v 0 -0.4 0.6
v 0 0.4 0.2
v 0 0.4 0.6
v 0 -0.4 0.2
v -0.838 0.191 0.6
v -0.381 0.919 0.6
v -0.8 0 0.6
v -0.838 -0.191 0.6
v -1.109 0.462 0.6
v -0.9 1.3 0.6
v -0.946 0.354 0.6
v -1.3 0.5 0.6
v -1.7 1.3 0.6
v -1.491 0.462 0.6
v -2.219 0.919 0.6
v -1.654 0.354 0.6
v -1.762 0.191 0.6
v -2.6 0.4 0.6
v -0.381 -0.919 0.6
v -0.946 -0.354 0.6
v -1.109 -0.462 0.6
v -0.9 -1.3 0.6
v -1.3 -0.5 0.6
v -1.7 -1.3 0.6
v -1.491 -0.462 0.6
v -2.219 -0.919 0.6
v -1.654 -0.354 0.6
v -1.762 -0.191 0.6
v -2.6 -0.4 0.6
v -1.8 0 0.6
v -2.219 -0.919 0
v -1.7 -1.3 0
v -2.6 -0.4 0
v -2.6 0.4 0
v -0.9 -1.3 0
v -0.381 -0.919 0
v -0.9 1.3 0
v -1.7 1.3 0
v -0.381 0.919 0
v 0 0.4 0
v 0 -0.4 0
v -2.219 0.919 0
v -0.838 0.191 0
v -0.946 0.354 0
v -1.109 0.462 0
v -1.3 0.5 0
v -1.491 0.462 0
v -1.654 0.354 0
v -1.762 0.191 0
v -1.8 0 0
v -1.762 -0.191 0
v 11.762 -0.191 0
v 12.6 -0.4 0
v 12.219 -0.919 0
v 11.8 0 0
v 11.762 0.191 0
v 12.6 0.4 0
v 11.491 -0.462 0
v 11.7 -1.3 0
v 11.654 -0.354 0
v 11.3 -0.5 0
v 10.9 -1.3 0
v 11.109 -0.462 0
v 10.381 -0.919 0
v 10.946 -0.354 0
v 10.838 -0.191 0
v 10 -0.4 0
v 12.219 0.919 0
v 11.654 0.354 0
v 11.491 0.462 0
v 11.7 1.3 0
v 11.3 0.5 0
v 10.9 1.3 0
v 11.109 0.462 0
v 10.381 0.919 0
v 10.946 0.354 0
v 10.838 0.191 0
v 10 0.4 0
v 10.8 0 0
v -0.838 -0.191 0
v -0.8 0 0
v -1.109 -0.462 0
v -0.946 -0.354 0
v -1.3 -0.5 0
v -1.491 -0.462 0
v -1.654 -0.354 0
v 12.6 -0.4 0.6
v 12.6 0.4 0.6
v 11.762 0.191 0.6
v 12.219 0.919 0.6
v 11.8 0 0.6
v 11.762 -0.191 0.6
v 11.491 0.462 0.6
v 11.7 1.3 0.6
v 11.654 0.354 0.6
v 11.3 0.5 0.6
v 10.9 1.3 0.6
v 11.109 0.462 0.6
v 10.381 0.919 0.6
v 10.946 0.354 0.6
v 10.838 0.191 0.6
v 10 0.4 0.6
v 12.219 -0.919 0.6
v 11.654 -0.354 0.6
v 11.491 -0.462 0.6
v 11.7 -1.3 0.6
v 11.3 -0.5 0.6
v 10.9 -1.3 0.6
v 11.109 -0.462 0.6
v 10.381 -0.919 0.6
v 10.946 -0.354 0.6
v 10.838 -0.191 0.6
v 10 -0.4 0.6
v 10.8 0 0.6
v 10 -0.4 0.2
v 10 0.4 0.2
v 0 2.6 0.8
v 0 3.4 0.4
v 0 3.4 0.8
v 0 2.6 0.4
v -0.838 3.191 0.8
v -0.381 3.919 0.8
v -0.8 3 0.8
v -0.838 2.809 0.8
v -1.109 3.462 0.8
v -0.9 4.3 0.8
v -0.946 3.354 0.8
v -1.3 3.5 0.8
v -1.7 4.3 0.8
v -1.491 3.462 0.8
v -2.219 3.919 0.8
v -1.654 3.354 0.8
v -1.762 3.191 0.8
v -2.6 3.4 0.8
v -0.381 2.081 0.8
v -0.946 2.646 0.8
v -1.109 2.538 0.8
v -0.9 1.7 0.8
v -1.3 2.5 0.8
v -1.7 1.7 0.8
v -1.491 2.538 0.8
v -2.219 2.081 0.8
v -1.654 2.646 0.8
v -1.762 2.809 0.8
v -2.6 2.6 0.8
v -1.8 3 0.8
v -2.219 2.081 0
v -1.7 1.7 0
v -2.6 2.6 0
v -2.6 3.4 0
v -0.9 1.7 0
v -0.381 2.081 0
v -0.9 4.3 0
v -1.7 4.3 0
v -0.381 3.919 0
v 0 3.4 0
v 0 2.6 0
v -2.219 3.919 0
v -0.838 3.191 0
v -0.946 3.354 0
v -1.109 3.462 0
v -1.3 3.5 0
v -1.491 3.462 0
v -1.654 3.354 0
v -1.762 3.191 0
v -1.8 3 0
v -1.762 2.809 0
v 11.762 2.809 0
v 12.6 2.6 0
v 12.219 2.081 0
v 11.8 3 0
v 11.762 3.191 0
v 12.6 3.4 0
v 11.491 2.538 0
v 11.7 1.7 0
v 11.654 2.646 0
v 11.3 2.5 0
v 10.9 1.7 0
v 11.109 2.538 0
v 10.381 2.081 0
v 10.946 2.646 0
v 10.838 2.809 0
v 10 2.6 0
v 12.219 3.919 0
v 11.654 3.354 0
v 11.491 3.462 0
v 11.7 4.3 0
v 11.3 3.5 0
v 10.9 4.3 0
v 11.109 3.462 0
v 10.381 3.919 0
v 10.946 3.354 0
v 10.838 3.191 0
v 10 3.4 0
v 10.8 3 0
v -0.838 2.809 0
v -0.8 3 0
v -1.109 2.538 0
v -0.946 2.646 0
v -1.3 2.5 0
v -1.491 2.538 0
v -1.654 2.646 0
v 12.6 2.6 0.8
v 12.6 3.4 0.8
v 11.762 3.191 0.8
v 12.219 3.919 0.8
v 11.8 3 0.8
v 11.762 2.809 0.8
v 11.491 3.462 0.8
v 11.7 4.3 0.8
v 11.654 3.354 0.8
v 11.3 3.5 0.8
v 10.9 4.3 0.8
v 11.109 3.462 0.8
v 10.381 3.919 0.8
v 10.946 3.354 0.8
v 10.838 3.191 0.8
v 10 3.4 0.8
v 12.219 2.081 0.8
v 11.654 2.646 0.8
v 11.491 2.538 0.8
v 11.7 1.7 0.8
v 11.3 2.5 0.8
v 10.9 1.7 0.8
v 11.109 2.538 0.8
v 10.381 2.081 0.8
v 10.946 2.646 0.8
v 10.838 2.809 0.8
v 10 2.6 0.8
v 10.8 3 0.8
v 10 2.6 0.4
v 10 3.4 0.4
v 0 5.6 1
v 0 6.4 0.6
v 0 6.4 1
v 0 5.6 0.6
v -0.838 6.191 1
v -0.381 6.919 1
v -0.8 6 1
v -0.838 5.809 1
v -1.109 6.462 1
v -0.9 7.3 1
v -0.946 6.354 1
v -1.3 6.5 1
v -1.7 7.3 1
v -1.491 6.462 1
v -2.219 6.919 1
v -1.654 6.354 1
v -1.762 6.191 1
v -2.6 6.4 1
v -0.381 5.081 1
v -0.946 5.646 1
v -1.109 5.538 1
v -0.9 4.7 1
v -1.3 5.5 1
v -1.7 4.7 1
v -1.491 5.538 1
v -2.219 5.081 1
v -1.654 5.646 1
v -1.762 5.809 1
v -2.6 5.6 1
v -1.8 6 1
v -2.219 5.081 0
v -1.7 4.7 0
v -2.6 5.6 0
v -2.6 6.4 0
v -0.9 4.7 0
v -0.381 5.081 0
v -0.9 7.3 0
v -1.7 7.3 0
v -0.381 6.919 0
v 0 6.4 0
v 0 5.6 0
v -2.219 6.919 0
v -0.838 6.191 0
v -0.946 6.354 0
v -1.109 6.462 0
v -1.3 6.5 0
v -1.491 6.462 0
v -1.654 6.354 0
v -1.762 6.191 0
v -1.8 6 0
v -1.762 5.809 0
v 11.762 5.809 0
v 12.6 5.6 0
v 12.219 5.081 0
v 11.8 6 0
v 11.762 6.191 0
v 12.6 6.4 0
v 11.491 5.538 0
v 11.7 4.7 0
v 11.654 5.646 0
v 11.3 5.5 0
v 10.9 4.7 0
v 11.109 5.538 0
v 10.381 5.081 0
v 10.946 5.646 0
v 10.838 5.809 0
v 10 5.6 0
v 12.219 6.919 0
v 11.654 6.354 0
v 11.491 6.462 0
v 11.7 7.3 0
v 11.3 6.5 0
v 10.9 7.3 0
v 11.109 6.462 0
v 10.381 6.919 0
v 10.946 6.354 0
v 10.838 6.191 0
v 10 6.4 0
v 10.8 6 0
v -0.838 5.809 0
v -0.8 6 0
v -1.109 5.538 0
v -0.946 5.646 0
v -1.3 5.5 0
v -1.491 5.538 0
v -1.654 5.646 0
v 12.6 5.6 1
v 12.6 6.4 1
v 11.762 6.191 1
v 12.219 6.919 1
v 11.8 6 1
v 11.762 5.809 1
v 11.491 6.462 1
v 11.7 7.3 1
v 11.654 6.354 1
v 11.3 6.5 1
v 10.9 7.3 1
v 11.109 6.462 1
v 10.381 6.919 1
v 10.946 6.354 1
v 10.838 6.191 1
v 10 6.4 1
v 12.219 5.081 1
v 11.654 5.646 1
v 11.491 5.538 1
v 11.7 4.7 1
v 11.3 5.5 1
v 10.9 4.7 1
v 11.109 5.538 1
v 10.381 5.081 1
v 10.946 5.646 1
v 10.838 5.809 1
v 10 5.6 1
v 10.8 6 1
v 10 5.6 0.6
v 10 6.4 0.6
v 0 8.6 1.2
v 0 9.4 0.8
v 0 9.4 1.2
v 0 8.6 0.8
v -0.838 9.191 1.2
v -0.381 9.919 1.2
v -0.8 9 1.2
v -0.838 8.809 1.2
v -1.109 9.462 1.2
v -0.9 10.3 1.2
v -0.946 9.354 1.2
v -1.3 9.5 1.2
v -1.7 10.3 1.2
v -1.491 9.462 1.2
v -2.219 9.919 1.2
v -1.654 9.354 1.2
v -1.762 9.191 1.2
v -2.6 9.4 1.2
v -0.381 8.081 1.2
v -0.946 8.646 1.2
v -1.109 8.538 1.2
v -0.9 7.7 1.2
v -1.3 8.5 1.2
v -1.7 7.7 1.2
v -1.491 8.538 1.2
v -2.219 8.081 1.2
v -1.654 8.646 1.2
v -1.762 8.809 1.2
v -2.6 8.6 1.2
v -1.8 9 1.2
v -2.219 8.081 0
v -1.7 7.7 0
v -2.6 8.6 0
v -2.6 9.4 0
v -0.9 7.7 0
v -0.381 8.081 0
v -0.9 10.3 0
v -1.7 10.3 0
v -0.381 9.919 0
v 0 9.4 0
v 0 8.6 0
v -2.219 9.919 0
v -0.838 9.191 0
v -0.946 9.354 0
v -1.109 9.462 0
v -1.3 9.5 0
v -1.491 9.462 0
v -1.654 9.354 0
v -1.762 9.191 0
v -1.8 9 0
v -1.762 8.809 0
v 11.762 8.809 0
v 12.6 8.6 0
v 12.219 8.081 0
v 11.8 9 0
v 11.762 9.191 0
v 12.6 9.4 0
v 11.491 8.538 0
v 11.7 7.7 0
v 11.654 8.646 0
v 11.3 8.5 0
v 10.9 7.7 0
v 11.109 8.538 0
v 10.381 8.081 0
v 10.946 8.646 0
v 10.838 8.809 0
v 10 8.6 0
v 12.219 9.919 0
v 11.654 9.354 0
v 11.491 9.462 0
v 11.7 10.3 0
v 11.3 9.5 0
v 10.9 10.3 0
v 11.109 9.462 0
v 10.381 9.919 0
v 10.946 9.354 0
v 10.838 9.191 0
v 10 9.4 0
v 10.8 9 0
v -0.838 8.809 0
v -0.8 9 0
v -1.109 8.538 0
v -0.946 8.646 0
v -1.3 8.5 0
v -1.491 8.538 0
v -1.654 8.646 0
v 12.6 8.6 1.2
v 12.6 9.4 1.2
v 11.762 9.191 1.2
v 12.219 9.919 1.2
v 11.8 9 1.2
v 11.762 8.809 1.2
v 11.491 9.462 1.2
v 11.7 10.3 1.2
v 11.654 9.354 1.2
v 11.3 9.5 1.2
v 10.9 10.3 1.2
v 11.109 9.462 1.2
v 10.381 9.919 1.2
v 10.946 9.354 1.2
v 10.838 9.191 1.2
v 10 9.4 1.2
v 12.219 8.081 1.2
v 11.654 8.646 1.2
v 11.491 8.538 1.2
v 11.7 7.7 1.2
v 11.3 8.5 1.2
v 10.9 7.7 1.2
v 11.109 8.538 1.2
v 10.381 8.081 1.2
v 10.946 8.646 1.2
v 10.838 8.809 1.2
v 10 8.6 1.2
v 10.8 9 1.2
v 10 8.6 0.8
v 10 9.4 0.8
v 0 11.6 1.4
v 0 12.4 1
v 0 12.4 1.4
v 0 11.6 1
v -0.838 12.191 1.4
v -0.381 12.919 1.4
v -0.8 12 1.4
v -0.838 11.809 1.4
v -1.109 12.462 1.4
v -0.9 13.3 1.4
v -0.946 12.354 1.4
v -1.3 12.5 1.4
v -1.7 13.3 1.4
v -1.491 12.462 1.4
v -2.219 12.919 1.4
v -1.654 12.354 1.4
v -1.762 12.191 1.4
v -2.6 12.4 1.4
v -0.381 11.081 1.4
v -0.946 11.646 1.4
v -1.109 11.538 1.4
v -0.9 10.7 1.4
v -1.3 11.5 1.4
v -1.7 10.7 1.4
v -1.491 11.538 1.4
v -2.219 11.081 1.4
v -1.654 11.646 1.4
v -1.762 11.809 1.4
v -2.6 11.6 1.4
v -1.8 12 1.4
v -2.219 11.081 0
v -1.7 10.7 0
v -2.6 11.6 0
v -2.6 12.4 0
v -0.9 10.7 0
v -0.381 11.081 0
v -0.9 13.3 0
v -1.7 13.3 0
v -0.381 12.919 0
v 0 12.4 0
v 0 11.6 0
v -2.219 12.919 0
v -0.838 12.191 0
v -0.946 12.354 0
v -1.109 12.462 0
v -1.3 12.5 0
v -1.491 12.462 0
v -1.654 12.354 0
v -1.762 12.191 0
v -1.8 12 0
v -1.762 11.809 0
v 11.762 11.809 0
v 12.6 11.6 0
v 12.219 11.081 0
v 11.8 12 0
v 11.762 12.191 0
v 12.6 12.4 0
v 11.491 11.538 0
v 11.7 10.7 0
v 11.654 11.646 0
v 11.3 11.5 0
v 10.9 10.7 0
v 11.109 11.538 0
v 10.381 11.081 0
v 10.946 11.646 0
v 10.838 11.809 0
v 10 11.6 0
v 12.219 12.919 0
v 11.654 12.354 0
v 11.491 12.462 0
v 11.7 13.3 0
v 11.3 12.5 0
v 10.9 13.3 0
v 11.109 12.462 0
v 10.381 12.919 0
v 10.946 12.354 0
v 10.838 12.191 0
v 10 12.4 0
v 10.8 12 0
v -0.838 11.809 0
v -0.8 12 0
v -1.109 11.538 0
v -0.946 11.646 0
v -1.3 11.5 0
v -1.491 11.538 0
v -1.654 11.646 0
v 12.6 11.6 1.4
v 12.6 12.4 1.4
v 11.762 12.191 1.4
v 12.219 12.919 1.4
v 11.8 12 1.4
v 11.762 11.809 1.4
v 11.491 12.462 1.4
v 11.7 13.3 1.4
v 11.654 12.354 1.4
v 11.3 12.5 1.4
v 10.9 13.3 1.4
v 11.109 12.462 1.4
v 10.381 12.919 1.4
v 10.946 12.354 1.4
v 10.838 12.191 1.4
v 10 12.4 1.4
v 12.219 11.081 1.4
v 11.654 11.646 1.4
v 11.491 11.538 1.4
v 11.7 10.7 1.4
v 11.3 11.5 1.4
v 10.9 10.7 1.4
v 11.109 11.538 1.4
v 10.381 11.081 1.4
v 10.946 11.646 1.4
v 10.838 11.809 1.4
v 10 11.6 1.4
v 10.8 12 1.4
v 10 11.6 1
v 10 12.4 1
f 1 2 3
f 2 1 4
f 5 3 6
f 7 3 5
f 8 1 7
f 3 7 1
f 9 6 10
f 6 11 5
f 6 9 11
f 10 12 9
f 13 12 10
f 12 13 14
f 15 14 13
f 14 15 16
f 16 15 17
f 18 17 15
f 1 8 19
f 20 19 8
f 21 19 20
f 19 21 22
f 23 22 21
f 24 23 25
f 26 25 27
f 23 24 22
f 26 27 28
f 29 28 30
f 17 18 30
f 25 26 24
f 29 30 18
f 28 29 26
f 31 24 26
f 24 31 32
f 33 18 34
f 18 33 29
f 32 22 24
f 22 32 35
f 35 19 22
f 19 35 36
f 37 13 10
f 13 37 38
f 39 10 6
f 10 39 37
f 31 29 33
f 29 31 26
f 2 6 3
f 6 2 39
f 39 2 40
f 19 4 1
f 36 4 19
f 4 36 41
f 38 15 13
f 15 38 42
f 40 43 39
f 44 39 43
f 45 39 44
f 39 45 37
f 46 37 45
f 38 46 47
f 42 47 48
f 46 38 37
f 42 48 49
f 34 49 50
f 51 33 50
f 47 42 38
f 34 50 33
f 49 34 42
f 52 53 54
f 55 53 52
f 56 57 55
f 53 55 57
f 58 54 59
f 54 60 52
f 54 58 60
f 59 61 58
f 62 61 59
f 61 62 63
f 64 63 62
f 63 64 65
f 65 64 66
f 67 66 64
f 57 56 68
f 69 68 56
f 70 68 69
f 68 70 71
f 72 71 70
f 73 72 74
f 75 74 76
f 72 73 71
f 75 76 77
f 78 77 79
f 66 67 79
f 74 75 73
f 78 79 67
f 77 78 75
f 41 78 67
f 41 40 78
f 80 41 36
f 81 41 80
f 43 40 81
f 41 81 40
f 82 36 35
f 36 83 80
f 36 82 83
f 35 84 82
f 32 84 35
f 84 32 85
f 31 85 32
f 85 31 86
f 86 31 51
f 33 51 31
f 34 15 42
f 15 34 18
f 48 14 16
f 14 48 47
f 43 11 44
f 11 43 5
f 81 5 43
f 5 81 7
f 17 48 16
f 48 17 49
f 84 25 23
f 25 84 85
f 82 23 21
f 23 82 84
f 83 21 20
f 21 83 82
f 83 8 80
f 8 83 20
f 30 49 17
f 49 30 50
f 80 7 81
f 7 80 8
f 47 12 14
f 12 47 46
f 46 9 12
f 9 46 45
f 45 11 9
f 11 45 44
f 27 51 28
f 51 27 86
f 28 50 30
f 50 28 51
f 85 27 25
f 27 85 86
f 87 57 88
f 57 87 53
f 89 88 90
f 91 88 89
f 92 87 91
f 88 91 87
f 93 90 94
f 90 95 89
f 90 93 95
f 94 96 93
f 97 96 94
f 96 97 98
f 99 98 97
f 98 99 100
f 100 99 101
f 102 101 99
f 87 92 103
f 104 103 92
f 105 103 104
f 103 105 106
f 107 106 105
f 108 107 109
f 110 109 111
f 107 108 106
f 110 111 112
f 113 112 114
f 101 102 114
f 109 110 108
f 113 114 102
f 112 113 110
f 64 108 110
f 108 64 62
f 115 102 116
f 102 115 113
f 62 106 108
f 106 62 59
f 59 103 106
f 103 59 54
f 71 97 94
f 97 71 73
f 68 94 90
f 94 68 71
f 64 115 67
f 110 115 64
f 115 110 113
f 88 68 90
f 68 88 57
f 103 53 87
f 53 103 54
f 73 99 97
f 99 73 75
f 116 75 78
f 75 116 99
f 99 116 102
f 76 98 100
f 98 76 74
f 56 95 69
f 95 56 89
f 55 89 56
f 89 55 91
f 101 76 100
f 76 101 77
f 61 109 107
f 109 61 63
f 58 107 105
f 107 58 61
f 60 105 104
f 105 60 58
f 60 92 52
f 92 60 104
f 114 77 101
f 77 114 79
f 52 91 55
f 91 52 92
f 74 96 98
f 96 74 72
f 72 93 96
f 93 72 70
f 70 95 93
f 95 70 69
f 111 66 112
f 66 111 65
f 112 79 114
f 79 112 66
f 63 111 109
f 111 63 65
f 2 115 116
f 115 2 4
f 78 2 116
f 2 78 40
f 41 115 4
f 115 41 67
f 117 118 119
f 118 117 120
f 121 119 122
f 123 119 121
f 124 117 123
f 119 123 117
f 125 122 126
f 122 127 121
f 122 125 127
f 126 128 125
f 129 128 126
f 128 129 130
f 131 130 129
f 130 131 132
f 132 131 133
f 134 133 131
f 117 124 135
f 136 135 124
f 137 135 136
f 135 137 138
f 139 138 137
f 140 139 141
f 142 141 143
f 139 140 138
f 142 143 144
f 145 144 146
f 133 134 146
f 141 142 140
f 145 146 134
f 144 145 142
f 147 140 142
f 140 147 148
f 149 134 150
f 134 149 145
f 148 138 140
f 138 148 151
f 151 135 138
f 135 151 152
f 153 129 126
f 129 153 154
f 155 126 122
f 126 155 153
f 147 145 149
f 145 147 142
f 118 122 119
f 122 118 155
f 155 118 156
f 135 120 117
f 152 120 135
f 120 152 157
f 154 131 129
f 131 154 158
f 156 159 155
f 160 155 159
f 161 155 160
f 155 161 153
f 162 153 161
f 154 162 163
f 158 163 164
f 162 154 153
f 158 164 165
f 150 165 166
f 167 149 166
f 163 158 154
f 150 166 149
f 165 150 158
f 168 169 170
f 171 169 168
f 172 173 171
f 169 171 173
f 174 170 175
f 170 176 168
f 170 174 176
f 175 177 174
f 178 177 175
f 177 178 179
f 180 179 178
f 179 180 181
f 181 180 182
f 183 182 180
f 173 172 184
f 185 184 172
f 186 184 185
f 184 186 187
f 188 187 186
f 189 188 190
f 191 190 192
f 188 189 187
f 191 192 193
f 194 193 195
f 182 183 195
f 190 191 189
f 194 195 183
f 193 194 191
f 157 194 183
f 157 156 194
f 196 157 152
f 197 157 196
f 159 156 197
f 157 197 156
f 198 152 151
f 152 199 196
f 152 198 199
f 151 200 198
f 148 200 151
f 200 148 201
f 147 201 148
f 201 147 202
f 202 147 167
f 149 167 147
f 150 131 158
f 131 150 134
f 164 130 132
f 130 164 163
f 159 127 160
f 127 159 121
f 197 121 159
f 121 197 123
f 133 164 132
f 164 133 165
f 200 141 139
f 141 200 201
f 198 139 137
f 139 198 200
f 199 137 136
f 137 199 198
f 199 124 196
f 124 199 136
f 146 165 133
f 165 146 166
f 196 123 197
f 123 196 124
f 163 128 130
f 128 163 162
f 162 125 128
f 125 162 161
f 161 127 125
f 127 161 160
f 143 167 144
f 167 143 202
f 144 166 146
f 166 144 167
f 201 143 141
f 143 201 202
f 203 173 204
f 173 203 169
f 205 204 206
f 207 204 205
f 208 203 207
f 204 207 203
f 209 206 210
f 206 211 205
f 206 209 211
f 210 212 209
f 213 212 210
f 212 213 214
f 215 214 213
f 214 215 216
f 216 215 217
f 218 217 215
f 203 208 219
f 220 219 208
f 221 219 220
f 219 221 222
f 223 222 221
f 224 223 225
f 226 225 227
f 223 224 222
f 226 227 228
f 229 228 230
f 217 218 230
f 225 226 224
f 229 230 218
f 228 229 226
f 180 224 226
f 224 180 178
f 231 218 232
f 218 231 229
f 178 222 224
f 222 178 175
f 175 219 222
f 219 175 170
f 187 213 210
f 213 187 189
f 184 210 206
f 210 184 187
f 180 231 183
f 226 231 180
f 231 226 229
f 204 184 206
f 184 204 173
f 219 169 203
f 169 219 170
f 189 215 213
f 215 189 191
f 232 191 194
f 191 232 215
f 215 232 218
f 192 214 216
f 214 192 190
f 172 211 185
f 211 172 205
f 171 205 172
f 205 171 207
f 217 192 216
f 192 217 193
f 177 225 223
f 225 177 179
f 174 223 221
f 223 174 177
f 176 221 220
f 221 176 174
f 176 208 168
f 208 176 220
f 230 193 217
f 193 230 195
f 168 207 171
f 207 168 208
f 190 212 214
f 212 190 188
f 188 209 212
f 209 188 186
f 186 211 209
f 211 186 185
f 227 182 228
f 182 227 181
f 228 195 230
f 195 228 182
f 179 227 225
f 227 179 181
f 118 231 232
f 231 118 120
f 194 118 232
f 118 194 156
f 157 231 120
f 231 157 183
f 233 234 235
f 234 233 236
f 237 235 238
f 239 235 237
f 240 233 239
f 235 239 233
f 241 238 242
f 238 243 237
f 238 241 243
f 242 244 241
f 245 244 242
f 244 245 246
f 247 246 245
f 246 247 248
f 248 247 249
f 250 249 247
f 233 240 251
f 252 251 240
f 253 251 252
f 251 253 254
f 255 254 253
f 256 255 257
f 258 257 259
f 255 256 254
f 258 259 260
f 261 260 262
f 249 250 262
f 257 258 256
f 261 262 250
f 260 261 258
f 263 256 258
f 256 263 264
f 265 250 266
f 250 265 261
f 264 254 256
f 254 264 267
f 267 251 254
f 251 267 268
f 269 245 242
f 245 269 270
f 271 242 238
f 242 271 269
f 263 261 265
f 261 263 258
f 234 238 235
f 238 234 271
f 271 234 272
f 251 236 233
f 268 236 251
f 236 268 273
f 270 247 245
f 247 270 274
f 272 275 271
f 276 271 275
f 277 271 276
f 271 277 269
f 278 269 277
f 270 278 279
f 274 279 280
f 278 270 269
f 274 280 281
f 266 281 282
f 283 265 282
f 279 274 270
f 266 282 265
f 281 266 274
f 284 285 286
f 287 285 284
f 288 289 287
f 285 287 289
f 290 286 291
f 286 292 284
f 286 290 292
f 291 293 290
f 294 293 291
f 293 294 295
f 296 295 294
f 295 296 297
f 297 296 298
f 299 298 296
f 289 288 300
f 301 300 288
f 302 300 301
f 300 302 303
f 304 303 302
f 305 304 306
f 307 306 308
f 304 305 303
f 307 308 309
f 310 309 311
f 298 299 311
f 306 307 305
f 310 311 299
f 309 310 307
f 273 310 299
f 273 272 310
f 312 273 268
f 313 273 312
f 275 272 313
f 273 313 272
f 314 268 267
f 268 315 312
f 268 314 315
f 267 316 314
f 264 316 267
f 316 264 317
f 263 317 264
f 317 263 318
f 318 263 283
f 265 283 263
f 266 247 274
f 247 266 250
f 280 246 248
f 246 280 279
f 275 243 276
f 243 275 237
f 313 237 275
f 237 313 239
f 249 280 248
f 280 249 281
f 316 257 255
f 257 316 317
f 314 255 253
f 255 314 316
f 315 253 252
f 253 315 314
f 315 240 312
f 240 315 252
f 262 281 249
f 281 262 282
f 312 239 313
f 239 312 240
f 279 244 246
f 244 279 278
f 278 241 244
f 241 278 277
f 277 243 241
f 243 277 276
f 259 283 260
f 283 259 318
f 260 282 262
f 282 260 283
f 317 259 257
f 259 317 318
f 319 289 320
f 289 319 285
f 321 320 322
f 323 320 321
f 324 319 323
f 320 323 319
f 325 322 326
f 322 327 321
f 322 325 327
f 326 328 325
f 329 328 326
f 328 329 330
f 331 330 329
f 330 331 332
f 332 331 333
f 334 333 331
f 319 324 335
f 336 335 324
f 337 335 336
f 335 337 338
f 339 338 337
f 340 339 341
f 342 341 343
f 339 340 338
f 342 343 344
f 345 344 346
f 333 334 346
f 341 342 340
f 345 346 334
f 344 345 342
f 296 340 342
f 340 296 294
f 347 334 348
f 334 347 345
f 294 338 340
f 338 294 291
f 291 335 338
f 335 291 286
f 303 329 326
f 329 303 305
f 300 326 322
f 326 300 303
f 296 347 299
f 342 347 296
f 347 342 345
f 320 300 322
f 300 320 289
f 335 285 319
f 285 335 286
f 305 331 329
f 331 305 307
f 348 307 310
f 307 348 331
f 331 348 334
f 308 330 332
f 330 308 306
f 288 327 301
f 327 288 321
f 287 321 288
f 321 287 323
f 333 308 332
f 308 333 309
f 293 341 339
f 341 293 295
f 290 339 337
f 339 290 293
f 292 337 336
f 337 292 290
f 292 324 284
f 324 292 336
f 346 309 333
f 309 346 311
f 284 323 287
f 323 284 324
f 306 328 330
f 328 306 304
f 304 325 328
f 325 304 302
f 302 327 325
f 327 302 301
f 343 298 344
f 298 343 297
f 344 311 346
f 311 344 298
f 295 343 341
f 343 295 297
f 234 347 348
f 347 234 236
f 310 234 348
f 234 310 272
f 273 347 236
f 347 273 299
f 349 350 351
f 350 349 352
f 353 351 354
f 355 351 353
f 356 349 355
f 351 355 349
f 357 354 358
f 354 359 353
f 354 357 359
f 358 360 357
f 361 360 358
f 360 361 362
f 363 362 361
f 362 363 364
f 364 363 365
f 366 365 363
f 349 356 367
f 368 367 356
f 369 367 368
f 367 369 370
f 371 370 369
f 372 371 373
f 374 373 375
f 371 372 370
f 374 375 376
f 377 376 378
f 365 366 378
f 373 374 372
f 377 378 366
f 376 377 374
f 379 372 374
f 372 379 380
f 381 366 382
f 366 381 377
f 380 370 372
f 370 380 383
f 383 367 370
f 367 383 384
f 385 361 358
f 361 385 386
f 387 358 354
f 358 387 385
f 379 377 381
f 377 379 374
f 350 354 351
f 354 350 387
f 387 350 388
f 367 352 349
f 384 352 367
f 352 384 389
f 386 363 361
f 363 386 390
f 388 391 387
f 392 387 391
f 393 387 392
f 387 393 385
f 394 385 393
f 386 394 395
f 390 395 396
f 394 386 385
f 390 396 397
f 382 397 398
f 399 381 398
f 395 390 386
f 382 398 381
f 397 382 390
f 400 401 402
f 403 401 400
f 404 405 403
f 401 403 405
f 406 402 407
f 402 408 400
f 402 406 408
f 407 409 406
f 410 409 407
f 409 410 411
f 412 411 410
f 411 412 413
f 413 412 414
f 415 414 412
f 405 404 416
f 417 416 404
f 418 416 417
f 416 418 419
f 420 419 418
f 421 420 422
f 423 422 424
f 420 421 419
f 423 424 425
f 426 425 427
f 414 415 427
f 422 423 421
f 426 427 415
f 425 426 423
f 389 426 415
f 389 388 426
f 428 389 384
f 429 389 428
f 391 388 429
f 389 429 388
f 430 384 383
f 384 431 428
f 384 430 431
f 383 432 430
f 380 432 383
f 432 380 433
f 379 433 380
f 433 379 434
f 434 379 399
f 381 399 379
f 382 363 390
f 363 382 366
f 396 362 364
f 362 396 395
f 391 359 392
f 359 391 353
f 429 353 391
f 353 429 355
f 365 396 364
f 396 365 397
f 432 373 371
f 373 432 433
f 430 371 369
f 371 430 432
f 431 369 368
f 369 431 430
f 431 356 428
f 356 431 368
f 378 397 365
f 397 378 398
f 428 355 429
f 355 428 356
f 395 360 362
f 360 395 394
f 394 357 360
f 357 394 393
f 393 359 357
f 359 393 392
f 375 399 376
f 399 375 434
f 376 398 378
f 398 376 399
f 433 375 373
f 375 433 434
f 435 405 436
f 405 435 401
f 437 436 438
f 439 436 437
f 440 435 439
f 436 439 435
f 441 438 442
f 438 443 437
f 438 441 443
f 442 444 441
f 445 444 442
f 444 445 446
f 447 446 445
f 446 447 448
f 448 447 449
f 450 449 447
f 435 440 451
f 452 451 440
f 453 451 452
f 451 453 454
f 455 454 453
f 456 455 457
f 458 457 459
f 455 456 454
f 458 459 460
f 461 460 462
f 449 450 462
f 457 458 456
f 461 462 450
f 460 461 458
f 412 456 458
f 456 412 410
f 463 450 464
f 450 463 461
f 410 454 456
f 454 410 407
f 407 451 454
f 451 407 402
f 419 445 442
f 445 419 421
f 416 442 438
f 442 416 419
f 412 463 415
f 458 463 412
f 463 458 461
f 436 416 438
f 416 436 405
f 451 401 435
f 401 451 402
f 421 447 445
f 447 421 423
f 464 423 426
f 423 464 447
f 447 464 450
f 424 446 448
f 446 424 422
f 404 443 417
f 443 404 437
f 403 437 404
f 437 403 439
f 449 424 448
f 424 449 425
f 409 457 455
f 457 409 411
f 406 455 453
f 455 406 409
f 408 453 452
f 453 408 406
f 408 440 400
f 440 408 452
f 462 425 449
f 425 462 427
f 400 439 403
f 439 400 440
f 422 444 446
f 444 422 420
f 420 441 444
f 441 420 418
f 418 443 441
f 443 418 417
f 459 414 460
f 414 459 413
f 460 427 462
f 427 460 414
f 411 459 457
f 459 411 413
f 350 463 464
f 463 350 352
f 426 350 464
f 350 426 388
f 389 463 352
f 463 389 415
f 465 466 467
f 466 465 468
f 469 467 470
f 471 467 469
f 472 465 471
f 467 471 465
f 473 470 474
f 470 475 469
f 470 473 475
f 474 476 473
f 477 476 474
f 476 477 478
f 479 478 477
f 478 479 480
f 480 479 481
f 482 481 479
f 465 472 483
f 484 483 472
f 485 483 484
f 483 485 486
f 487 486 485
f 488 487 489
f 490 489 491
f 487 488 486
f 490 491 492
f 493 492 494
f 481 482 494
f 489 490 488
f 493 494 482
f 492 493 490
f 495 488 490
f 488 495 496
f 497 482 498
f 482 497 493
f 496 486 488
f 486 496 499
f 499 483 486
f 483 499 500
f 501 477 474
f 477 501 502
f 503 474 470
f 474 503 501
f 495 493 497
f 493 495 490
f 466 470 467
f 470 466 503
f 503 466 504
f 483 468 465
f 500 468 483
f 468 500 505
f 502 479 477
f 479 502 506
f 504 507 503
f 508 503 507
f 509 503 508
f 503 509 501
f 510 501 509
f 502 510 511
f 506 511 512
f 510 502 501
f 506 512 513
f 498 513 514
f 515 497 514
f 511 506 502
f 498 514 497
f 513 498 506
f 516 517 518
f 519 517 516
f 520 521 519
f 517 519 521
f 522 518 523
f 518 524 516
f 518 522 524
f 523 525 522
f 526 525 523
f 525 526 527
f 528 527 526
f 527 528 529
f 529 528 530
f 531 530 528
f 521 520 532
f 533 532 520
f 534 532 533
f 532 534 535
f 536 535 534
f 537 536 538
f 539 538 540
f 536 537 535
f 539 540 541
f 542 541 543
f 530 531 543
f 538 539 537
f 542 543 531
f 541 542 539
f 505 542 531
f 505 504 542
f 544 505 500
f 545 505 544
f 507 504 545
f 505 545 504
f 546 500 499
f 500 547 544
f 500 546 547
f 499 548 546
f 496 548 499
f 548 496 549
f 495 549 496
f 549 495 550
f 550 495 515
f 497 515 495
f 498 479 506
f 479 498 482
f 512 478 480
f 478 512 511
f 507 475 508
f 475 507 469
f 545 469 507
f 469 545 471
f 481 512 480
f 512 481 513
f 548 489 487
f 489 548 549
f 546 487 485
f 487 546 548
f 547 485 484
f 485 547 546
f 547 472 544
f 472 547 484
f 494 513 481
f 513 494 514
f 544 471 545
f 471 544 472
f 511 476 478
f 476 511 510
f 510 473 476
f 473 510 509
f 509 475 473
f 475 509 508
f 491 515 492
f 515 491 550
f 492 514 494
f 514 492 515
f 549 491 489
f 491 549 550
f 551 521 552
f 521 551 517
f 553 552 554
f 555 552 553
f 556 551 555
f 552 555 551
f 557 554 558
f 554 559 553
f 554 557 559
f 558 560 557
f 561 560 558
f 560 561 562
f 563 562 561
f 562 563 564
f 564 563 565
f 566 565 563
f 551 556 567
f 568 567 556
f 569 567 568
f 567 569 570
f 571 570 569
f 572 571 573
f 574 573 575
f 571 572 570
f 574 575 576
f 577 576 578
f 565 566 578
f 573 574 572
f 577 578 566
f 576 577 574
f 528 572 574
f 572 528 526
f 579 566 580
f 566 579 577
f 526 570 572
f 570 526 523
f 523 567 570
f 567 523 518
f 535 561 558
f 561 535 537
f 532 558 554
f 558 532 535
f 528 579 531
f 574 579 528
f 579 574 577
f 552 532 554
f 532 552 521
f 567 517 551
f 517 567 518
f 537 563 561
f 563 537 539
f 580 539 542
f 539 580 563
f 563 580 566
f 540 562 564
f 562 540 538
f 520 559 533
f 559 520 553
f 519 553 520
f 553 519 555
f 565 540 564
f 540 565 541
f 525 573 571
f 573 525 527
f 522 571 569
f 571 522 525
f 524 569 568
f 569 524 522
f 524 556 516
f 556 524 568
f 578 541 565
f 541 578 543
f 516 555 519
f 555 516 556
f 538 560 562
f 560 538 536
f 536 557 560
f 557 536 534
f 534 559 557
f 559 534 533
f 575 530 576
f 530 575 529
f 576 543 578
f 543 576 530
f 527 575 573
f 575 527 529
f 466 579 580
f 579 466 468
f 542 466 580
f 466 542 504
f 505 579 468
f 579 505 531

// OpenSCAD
// Simple Conductivity Tests.

render_part="resistance test";

in2mm=25.4;

layer_th=0.2;
nozzle_d=0.4;

probe_d=1.0;

module probe(id=probe_d,od=probe_d+4*nozzle_d,h=layer_th,flat_w=2*nozzle_d) {
    difference() {
        hull() {
            cylinder(r=od/2,h=h,center=false,$fn=16);
            translate([0,0,h/2]) cube([flat_w,od,h],center=true);
            translate([0,0,h/2]) cube([od,flat_w,h],center=true);
        }
        cylinder(r=id/2,h=3*h,center=true,$fn=16);
    }
}

module resistance_test(th=layer_th,w=2*nozzle_d,l=10.0,nozzle_d=nozzle_d,probe_d=probe_d,layer_th=layer_th) {
    probe_h=th+2*layer_th;
    translate([-2*nozzle_d-probe_d/2,0,0]) {
        probe(id=probe_d,od=probe_d+4*nozzle_d,h=probe_h,flat_w=w);
    }
    translate([-nozzle_d,-w/2,0]) {
        cube([2*nozzle_d+l,w,th],center=false);
    }
    translate([l+2*nozzle_d+probe_d/2,0,0]) {
        probe(id=probe_d,od=probe_d+4*nozzle_d,h=probe_h,flat_w=w);
    }
}

if(render_part=="resistance test") {
    echo("Resistance test part");
    for(i=[0:4]) translate([0,i*(probe_d+5*nozzle_d),0]) {
        resistance_test(th=layer_th+i*layer_th);
    }
}
